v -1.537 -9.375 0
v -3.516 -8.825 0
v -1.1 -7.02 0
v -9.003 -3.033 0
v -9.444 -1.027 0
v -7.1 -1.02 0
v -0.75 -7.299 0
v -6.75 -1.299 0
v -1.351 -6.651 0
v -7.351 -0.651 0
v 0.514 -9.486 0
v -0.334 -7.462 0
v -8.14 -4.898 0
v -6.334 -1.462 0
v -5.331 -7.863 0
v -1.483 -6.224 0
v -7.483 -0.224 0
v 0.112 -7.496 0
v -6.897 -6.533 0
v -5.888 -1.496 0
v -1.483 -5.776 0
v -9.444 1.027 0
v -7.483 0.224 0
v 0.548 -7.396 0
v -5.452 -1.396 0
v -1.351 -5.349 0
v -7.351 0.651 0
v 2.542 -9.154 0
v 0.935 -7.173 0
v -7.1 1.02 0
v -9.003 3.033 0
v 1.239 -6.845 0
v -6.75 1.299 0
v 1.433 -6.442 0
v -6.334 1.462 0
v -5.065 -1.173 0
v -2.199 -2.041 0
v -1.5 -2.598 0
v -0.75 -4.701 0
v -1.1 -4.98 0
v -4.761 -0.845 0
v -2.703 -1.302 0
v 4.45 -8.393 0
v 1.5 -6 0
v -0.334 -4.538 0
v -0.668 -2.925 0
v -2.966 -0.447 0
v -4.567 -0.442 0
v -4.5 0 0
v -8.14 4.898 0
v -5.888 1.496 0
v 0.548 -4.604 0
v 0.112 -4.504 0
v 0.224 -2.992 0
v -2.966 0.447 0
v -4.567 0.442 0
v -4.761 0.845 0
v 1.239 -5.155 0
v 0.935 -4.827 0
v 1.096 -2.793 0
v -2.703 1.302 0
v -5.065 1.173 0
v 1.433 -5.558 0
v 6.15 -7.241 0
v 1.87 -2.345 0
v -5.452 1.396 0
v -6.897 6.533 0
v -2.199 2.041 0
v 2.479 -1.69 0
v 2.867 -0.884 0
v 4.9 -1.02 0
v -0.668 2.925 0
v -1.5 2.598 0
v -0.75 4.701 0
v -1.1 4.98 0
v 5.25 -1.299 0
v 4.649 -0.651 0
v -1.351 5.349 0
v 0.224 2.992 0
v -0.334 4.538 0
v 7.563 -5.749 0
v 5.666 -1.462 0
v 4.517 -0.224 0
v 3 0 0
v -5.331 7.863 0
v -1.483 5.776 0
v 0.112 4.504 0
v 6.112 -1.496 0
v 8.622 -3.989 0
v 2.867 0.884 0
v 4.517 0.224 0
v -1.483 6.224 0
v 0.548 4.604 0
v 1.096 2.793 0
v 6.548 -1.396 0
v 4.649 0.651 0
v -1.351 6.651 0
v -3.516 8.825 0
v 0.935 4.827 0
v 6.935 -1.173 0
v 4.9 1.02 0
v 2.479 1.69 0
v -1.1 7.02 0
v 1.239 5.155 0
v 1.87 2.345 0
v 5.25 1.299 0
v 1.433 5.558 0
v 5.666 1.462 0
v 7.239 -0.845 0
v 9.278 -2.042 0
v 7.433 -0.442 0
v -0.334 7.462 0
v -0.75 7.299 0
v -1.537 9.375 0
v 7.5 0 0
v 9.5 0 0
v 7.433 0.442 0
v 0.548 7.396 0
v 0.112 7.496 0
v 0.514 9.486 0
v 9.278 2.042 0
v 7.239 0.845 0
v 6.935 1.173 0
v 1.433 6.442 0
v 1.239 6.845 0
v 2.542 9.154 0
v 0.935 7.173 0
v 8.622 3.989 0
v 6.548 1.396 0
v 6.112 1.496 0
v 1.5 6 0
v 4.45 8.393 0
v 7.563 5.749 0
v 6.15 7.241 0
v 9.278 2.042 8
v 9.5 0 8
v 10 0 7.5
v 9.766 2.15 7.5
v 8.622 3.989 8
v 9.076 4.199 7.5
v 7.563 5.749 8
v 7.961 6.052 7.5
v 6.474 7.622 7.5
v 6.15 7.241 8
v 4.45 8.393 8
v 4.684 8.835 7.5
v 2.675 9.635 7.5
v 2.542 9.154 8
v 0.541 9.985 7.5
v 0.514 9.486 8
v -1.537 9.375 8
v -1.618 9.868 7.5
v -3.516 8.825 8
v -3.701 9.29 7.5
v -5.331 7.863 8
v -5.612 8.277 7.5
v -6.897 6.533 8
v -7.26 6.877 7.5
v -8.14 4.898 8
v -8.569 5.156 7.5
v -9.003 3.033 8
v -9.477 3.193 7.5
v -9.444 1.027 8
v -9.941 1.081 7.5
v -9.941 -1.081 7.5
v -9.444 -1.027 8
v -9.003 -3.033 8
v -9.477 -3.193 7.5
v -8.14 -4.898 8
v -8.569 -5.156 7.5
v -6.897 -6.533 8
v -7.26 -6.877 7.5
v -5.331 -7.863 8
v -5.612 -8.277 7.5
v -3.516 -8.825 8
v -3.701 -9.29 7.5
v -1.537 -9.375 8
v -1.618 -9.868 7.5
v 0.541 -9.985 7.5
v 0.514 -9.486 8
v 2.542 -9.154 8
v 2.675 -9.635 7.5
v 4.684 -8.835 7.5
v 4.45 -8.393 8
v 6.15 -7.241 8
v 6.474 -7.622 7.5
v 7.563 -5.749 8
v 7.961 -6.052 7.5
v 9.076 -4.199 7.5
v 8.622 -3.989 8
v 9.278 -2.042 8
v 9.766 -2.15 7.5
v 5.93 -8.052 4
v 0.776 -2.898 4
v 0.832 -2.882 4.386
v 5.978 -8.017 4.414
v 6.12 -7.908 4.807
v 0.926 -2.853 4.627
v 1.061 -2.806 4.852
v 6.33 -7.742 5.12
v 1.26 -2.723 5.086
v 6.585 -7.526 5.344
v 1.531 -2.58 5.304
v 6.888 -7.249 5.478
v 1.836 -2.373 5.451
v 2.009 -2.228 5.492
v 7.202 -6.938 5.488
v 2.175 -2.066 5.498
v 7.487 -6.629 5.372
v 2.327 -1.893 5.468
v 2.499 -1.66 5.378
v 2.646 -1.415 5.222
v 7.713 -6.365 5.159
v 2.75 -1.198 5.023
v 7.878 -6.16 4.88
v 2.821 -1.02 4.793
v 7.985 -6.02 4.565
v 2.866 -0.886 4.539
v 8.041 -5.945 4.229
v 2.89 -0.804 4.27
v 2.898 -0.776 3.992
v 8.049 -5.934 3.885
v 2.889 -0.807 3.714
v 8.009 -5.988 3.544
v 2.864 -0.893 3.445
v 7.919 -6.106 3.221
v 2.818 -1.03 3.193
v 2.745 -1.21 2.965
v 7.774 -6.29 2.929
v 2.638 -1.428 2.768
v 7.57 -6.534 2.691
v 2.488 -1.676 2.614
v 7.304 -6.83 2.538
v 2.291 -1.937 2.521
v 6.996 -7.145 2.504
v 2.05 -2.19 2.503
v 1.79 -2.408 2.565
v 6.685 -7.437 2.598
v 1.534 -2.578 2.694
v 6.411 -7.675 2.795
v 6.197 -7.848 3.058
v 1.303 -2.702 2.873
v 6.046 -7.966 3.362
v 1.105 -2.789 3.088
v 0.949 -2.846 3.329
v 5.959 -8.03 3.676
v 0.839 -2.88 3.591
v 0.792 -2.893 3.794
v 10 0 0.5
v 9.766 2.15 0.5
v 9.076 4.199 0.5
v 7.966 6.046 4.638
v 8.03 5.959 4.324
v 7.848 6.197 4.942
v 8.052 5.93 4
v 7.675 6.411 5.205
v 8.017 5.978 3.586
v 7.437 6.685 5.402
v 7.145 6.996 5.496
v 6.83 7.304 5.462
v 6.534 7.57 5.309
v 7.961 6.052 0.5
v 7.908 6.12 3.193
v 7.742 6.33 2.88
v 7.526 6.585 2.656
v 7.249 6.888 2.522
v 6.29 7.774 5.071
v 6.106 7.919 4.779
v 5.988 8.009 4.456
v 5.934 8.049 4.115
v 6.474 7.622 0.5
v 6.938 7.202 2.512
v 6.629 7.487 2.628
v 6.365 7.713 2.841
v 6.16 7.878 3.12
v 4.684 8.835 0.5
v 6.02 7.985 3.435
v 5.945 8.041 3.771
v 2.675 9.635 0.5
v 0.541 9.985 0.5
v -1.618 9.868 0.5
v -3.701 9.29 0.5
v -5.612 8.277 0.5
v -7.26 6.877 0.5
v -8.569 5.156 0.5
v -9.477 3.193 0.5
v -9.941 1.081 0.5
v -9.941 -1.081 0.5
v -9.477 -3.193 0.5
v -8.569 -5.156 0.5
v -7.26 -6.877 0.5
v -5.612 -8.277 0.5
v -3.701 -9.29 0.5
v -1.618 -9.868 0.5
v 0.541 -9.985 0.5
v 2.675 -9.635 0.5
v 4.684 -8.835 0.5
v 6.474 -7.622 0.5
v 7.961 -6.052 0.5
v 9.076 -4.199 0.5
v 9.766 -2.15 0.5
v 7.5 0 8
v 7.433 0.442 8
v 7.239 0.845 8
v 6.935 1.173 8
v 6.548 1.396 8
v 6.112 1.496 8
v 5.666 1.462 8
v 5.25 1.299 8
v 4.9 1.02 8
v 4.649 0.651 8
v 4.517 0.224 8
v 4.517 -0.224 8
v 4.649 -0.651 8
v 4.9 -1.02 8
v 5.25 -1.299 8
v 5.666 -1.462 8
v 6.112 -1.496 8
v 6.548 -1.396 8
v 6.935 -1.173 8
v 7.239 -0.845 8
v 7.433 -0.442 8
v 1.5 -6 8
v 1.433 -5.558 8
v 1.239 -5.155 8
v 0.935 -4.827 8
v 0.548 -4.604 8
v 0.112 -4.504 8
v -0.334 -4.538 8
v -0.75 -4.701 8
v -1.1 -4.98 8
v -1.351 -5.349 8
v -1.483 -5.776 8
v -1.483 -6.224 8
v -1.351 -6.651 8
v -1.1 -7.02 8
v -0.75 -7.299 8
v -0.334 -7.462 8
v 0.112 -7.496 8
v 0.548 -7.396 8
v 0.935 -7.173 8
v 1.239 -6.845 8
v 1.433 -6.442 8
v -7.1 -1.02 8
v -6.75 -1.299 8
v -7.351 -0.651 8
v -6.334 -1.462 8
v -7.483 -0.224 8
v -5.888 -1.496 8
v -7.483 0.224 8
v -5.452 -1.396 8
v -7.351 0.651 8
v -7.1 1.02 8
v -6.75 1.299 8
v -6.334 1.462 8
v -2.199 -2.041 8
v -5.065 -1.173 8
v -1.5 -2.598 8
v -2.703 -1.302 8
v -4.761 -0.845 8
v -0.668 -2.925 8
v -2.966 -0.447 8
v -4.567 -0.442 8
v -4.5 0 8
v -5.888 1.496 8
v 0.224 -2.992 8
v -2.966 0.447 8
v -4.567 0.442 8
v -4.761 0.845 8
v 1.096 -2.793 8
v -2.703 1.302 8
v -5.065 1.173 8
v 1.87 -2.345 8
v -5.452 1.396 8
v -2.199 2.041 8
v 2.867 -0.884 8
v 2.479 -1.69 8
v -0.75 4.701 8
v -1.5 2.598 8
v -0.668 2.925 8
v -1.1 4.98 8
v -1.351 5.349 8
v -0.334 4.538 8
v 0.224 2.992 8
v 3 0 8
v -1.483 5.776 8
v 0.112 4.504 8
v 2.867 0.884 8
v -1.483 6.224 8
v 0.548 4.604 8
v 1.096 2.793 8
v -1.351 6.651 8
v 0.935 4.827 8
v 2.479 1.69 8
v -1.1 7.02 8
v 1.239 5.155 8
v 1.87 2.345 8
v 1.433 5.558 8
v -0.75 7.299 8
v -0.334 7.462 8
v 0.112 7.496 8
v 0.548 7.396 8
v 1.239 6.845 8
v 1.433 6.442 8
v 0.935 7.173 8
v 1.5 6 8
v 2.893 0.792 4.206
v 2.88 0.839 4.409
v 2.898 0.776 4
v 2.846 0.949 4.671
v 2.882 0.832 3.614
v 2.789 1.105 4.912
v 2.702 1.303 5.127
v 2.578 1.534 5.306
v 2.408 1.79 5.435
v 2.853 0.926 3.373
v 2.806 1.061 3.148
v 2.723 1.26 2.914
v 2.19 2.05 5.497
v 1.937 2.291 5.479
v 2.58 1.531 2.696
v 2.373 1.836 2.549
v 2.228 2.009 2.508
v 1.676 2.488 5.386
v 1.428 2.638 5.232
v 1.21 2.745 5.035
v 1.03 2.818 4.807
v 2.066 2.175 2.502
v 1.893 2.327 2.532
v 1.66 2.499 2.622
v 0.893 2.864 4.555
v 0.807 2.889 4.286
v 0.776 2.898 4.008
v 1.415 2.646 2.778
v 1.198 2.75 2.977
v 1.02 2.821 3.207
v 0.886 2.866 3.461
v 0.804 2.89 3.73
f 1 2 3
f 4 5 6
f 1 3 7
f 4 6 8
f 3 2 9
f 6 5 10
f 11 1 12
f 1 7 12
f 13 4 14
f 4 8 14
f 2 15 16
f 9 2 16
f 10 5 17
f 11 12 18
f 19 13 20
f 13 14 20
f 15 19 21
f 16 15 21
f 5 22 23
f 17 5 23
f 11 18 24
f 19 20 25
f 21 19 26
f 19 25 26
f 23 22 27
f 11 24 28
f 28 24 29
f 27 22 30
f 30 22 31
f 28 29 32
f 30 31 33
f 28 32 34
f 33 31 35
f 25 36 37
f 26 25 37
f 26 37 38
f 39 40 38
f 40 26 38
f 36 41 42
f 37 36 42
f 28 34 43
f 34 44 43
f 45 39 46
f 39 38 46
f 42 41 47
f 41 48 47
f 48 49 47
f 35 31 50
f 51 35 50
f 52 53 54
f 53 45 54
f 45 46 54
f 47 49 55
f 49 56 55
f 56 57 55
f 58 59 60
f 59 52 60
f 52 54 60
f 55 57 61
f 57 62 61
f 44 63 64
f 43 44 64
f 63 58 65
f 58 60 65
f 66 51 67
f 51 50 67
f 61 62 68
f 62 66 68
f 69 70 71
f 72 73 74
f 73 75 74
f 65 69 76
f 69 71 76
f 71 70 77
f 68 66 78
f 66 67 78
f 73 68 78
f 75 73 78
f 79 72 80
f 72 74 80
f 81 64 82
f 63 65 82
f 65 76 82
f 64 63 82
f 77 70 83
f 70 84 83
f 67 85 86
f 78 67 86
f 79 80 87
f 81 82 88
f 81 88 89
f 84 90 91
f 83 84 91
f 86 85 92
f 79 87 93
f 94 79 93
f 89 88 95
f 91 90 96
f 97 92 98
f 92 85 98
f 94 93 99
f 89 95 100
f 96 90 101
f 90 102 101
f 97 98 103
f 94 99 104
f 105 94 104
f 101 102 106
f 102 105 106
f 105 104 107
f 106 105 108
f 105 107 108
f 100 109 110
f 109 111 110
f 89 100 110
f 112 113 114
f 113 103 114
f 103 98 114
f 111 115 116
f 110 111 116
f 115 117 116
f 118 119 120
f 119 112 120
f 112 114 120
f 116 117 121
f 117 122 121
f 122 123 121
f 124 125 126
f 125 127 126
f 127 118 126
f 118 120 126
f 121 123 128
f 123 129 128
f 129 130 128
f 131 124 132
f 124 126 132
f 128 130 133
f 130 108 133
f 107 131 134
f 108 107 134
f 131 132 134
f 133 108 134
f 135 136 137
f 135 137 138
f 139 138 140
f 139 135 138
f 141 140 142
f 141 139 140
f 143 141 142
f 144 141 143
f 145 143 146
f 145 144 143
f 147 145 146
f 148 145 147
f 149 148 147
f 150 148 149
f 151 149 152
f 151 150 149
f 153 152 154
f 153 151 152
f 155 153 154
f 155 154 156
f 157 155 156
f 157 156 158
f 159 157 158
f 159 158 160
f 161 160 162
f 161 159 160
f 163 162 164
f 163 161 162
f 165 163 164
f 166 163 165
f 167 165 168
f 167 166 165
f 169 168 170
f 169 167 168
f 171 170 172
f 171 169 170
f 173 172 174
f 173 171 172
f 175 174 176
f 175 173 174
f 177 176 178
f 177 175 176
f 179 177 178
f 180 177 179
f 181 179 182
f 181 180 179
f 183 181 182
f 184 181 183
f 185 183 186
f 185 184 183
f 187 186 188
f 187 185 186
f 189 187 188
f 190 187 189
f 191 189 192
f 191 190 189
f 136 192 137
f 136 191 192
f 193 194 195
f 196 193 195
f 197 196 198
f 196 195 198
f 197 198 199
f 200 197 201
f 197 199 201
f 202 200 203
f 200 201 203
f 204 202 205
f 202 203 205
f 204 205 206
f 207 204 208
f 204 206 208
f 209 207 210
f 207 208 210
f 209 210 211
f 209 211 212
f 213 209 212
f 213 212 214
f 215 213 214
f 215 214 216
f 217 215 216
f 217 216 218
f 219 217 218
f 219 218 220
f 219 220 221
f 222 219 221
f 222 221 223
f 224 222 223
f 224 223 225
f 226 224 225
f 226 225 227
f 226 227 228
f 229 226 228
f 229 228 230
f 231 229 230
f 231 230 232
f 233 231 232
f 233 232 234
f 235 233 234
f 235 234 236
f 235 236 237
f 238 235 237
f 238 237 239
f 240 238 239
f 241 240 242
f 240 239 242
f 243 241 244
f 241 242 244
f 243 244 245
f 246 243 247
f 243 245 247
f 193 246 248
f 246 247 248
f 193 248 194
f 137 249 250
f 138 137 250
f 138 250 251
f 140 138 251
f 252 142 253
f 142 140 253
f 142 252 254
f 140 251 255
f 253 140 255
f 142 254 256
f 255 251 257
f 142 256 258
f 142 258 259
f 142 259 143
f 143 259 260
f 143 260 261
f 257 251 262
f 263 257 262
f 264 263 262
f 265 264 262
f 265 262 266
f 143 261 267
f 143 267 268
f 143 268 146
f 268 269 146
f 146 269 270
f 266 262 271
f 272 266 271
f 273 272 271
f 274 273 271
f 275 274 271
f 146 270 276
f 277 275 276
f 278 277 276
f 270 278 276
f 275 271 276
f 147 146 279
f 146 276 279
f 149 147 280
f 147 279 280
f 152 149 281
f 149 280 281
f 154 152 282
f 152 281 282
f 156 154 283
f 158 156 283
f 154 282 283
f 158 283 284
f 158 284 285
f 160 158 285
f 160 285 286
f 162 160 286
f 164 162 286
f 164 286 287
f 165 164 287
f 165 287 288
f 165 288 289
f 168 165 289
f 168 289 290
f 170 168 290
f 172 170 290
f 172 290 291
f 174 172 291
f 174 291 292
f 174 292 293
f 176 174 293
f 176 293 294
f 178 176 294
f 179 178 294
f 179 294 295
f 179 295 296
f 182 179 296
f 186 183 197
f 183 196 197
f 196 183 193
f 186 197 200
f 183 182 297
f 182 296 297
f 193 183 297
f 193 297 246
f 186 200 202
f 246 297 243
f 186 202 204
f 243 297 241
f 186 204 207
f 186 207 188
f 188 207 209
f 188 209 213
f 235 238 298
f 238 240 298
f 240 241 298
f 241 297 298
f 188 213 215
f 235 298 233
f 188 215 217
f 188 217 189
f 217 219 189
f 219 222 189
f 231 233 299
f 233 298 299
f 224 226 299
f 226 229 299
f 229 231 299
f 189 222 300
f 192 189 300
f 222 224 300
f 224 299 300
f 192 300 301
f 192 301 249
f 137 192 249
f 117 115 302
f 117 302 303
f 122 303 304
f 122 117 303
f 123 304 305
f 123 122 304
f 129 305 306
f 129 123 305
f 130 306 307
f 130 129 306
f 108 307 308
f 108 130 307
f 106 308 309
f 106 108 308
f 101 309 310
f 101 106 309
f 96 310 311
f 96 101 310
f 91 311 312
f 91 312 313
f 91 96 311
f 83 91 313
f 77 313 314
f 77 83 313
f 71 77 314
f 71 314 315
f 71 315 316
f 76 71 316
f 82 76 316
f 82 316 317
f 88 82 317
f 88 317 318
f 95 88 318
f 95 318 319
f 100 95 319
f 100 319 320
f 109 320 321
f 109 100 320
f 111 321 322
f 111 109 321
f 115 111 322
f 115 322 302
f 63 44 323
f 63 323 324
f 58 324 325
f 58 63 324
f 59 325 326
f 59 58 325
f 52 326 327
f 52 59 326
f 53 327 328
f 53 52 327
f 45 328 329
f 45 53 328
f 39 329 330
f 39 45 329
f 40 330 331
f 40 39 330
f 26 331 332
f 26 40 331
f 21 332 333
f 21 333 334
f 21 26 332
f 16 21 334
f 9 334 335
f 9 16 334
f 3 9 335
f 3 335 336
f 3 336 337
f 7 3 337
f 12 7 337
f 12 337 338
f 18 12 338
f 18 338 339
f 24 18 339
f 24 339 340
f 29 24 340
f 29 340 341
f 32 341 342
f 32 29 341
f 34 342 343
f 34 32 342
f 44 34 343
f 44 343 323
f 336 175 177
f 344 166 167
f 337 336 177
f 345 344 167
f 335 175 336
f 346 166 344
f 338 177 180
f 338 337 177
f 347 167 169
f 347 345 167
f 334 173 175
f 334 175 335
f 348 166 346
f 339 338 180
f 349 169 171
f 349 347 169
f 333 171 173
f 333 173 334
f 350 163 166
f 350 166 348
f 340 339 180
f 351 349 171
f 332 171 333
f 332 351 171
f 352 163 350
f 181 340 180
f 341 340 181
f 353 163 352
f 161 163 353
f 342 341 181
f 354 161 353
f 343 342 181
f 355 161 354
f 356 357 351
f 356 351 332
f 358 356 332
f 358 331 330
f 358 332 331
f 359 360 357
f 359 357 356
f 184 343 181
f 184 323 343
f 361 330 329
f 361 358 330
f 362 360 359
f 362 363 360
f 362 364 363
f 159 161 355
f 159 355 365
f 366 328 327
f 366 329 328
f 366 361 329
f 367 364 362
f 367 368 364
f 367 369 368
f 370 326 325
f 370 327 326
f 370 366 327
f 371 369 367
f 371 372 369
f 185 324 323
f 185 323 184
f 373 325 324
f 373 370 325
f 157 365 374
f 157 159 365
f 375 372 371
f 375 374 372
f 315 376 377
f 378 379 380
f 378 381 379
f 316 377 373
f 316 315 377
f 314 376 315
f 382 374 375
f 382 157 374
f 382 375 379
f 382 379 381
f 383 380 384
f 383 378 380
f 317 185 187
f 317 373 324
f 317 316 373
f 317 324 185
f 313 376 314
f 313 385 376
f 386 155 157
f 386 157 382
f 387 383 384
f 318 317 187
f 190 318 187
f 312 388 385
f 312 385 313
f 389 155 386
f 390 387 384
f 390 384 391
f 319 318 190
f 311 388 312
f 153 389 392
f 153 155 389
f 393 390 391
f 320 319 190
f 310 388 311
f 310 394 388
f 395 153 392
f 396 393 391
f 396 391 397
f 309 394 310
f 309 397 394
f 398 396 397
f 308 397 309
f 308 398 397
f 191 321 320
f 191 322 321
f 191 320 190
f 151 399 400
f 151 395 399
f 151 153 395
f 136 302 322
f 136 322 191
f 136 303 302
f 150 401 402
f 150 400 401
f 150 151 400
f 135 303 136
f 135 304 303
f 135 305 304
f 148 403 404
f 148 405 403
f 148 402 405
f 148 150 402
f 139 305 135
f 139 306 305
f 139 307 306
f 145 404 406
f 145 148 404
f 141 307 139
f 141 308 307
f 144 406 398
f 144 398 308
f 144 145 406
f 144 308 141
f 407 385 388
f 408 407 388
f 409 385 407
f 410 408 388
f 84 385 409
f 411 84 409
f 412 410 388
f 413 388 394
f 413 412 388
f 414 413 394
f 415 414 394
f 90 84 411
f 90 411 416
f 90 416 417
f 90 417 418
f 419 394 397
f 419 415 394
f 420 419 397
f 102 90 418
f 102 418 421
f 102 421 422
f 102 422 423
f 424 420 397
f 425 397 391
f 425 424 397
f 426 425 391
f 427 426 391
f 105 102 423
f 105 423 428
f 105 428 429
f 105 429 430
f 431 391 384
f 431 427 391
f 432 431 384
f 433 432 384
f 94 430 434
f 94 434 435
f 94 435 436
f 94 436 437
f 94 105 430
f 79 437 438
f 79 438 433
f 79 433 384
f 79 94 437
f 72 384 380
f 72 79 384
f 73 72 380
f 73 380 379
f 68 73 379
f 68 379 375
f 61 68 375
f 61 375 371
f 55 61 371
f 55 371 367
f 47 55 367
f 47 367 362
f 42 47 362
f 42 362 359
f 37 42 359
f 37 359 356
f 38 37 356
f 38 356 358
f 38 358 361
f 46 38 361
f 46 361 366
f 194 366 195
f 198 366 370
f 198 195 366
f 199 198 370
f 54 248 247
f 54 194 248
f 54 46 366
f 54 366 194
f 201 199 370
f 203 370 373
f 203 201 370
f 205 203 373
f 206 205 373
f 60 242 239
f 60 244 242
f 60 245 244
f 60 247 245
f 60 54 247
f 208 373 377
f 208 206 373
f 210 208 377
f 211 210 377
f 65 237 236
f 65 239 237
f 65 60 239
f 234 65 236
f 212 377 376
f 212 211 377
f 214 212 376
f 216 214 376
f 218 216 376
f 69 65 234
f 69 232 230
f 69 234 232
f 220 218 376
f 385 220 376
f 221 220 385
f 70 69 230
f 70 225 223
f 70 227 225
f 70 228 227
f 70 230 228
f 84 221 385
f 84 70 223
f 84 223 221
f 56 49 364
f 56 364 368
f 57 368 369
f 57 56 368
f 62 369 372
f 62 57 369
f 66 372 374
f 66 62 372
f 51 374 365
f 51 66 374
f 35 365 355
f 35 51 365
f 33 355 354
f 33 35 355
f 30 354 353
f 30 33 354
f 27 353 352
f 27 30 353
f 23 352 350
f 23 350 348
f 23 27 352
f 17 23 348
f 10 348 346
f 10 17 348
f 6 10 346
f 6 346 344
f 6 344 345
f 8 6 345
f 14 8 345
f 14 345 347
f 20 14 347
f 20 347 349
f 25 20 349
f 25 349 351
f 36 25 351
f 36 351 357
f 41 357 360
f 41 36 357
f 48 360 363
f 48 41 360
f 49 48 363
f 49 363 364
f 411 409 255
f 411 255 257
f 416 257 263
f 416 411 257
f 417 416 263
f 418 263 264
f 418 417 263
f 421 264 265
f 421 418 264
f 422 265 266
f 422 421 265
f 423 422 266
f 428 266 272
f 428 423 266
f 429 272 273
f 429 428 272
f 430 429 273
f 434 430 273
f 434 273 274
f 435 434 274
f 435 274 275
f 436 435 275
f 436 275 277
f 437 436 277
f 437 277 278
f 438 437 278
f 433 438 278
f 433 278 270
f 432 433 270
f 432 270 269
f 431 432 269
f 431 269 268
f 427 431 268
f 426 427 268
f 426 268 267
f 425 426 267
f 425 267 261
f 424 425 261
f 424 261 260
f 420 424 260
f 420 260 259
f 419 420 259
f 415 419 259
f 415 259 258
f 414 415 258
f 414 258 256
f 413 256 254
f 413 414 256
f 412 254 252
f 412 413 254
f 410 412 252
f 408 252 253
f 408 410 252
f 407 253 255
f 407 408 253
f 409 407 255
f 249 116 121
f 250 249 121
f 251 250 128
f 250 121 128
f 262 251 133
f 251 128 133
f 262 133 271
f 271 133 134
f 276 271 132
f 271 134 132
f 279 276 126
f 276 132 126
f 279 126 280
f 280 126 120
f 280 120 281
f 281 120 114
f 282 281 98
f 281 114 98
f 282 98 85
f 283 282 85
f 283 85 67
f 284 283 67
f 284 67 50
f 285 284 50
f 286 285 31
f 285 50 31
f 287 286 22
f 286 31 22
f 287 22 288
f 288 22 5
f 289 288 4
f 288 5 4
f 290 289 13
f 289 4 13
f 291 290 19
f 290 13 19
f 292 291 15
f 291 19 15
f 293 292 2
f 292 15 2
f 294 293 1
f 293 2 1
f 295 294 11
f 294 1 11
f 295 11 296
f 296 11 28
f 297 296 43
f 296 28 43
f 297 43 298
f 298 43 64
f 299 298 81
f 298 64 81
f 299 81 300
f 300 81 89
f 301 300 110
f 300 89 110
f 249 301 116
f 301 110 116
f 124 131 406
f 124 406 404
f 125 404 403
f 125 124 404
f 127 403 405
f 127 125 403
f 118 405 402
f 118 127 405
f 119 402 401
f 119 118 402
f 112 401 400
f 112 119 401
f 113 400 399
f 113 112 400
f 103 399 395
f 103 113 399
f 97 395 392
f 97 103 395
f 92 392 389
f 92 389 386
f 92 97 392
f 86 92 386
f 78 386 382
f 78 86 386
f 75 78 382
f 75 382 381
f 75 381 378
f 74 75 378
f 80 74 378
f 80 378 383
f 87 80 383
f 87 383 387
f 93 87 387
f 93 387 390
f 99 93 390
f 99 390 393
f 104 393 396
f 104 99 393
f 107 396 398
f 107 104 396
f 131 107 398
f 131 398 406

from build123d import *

# Parameters (mm, degrees)
SKETCH_1_R               = 10
SKETCH_1_R_2             = 3
SKETCH_1_R_3             = 1.5
EXTRUDE_1_DEPTH          = 8
CUT_EXTRUDE_1_REACH      = 18.248
CUT_EXTRUDE_1_END_RADIUS = 10
SKETCH_2_R               = 1.5
CUT_EXTRUDE_2_REACH      = 18.248
CUT_EXTRUDE_2_END_RADIUS = 10
SKETCH_3_R               = 1.5
CHAMFER_1_SIZE           = 0.5


with BuildPart() as part:
    # ｽｹｯﾁ1 → ﾎﾞｽ - 押し出し1 (new body)
    with BuildSketch(Plane.XY):
        Circle(SKETCH_1_R)
        Circle(SKETCH_1_R_2, mode=Mode.SUBTRACT)
        with Locations((-6, 0)):
            Circle(SKETCH_1_R_3, mode=Mode.SUBTRACT)
        with Locations((6, 0)):
            Circle(SKETCH_1_R_3, mode=Mode.SUBTRACT)
        with Locations((0, 6)):
            Circle(SKETCH_1_R_3, mode=Mode.SUBTRACT)
        with Locations((0, -6)):
            Circle(SKETCH_1_R_3, mode=Mode.SUBTRACT)
    extrude(amount=EXTRUDE_1_DEPTH)

    # ｶｯﾄ - 押し出し1: up to this cylinder (the profile starts inside it)
    cut_extrude_1_end = Plane(origin=(0, 0, 4), z_dir=(0, 0, -1)) * Cylinder(CUT_EXTRUDE_1_END_RADIUS, 57.496, mode=Mode.PRIVATE)
    # ｽｹｯﾁ2 → ｶｯﾄ - 押し出し1 (cut, up to the surface)
    with BuildSketch(Plane(origin=(0, 0, 0), x_dir=(0.7071067811865477, -0.7071067811865475, 0), z_dir=(0.7071067811865475, 0.7071067811865477, 0)), mode=Mode.PRIVATE) as cut_extrude_1_sk1:
        with Locations((0, -4)):
            Circle(SKETCH_2_R)
    cut_extrude_1_tool1 = extrude(cut_extrude_1_sk1.sketch, amount=CUT_EXTRUDE_1_REACH, mode=Mode.PRIVATE) & cut_extrude_1_end
    add(cut_extrude_1_tool1.solids().sort_by_distance((0, 0, 4))[0], mode=Mode.SUBTRACT)

    # ｶｯﾄ - 押し出し2: up to this cylinder (the profile starts inside it)
    cut_extrude_2_end = Plane(origin=(0, 0, 4), z_dir=(0, 0, -1)) * Cylinder(CUT_EXTRUDE_2_END_RADIUS, 57.496, mode=Mode.PRIVATE)
    # ｽｹｯﾁ3 → ｶｯﾄ - 押し出し2 (cut, up to the surface)
    with BuildSketch(Plane(origin=(0, 0, 0), x_dir=(0.7071067811865477, 0.7071067811865475, 0), z_dir=(-0.7071067811865475, 0.7071067811865477, 0)), mode=Mode.PRIVATE) as cut_extrude_2_sk1:
        with Locations(Location((0, -4, 0), (0, 0, 180))):
            Circle(SKETCH_3_R)
    cut_extrude_2_tool1 = extrude(cut_extrude_2_sk1.sketch, amount=-CUT_EXTRUDE_2_REACH, mode=Mode.PRIVATE) & cut_extrude_2_end
    add(cut_extrude_2_tool1.solids().sort_by_distance((0, 0, 4))[0], mode=Mode.SUBTRACT)

    # 面取り1
    chamfer_1_edges = [part.edges().sort_by_distance(p)[0] for p in [
        (-10, 0, 0),
        (-10, 0, 8),
    ]]
    chamfer(chamfer_1_edges, length=CHAMFER_1_SIZE)


solid = part.part
